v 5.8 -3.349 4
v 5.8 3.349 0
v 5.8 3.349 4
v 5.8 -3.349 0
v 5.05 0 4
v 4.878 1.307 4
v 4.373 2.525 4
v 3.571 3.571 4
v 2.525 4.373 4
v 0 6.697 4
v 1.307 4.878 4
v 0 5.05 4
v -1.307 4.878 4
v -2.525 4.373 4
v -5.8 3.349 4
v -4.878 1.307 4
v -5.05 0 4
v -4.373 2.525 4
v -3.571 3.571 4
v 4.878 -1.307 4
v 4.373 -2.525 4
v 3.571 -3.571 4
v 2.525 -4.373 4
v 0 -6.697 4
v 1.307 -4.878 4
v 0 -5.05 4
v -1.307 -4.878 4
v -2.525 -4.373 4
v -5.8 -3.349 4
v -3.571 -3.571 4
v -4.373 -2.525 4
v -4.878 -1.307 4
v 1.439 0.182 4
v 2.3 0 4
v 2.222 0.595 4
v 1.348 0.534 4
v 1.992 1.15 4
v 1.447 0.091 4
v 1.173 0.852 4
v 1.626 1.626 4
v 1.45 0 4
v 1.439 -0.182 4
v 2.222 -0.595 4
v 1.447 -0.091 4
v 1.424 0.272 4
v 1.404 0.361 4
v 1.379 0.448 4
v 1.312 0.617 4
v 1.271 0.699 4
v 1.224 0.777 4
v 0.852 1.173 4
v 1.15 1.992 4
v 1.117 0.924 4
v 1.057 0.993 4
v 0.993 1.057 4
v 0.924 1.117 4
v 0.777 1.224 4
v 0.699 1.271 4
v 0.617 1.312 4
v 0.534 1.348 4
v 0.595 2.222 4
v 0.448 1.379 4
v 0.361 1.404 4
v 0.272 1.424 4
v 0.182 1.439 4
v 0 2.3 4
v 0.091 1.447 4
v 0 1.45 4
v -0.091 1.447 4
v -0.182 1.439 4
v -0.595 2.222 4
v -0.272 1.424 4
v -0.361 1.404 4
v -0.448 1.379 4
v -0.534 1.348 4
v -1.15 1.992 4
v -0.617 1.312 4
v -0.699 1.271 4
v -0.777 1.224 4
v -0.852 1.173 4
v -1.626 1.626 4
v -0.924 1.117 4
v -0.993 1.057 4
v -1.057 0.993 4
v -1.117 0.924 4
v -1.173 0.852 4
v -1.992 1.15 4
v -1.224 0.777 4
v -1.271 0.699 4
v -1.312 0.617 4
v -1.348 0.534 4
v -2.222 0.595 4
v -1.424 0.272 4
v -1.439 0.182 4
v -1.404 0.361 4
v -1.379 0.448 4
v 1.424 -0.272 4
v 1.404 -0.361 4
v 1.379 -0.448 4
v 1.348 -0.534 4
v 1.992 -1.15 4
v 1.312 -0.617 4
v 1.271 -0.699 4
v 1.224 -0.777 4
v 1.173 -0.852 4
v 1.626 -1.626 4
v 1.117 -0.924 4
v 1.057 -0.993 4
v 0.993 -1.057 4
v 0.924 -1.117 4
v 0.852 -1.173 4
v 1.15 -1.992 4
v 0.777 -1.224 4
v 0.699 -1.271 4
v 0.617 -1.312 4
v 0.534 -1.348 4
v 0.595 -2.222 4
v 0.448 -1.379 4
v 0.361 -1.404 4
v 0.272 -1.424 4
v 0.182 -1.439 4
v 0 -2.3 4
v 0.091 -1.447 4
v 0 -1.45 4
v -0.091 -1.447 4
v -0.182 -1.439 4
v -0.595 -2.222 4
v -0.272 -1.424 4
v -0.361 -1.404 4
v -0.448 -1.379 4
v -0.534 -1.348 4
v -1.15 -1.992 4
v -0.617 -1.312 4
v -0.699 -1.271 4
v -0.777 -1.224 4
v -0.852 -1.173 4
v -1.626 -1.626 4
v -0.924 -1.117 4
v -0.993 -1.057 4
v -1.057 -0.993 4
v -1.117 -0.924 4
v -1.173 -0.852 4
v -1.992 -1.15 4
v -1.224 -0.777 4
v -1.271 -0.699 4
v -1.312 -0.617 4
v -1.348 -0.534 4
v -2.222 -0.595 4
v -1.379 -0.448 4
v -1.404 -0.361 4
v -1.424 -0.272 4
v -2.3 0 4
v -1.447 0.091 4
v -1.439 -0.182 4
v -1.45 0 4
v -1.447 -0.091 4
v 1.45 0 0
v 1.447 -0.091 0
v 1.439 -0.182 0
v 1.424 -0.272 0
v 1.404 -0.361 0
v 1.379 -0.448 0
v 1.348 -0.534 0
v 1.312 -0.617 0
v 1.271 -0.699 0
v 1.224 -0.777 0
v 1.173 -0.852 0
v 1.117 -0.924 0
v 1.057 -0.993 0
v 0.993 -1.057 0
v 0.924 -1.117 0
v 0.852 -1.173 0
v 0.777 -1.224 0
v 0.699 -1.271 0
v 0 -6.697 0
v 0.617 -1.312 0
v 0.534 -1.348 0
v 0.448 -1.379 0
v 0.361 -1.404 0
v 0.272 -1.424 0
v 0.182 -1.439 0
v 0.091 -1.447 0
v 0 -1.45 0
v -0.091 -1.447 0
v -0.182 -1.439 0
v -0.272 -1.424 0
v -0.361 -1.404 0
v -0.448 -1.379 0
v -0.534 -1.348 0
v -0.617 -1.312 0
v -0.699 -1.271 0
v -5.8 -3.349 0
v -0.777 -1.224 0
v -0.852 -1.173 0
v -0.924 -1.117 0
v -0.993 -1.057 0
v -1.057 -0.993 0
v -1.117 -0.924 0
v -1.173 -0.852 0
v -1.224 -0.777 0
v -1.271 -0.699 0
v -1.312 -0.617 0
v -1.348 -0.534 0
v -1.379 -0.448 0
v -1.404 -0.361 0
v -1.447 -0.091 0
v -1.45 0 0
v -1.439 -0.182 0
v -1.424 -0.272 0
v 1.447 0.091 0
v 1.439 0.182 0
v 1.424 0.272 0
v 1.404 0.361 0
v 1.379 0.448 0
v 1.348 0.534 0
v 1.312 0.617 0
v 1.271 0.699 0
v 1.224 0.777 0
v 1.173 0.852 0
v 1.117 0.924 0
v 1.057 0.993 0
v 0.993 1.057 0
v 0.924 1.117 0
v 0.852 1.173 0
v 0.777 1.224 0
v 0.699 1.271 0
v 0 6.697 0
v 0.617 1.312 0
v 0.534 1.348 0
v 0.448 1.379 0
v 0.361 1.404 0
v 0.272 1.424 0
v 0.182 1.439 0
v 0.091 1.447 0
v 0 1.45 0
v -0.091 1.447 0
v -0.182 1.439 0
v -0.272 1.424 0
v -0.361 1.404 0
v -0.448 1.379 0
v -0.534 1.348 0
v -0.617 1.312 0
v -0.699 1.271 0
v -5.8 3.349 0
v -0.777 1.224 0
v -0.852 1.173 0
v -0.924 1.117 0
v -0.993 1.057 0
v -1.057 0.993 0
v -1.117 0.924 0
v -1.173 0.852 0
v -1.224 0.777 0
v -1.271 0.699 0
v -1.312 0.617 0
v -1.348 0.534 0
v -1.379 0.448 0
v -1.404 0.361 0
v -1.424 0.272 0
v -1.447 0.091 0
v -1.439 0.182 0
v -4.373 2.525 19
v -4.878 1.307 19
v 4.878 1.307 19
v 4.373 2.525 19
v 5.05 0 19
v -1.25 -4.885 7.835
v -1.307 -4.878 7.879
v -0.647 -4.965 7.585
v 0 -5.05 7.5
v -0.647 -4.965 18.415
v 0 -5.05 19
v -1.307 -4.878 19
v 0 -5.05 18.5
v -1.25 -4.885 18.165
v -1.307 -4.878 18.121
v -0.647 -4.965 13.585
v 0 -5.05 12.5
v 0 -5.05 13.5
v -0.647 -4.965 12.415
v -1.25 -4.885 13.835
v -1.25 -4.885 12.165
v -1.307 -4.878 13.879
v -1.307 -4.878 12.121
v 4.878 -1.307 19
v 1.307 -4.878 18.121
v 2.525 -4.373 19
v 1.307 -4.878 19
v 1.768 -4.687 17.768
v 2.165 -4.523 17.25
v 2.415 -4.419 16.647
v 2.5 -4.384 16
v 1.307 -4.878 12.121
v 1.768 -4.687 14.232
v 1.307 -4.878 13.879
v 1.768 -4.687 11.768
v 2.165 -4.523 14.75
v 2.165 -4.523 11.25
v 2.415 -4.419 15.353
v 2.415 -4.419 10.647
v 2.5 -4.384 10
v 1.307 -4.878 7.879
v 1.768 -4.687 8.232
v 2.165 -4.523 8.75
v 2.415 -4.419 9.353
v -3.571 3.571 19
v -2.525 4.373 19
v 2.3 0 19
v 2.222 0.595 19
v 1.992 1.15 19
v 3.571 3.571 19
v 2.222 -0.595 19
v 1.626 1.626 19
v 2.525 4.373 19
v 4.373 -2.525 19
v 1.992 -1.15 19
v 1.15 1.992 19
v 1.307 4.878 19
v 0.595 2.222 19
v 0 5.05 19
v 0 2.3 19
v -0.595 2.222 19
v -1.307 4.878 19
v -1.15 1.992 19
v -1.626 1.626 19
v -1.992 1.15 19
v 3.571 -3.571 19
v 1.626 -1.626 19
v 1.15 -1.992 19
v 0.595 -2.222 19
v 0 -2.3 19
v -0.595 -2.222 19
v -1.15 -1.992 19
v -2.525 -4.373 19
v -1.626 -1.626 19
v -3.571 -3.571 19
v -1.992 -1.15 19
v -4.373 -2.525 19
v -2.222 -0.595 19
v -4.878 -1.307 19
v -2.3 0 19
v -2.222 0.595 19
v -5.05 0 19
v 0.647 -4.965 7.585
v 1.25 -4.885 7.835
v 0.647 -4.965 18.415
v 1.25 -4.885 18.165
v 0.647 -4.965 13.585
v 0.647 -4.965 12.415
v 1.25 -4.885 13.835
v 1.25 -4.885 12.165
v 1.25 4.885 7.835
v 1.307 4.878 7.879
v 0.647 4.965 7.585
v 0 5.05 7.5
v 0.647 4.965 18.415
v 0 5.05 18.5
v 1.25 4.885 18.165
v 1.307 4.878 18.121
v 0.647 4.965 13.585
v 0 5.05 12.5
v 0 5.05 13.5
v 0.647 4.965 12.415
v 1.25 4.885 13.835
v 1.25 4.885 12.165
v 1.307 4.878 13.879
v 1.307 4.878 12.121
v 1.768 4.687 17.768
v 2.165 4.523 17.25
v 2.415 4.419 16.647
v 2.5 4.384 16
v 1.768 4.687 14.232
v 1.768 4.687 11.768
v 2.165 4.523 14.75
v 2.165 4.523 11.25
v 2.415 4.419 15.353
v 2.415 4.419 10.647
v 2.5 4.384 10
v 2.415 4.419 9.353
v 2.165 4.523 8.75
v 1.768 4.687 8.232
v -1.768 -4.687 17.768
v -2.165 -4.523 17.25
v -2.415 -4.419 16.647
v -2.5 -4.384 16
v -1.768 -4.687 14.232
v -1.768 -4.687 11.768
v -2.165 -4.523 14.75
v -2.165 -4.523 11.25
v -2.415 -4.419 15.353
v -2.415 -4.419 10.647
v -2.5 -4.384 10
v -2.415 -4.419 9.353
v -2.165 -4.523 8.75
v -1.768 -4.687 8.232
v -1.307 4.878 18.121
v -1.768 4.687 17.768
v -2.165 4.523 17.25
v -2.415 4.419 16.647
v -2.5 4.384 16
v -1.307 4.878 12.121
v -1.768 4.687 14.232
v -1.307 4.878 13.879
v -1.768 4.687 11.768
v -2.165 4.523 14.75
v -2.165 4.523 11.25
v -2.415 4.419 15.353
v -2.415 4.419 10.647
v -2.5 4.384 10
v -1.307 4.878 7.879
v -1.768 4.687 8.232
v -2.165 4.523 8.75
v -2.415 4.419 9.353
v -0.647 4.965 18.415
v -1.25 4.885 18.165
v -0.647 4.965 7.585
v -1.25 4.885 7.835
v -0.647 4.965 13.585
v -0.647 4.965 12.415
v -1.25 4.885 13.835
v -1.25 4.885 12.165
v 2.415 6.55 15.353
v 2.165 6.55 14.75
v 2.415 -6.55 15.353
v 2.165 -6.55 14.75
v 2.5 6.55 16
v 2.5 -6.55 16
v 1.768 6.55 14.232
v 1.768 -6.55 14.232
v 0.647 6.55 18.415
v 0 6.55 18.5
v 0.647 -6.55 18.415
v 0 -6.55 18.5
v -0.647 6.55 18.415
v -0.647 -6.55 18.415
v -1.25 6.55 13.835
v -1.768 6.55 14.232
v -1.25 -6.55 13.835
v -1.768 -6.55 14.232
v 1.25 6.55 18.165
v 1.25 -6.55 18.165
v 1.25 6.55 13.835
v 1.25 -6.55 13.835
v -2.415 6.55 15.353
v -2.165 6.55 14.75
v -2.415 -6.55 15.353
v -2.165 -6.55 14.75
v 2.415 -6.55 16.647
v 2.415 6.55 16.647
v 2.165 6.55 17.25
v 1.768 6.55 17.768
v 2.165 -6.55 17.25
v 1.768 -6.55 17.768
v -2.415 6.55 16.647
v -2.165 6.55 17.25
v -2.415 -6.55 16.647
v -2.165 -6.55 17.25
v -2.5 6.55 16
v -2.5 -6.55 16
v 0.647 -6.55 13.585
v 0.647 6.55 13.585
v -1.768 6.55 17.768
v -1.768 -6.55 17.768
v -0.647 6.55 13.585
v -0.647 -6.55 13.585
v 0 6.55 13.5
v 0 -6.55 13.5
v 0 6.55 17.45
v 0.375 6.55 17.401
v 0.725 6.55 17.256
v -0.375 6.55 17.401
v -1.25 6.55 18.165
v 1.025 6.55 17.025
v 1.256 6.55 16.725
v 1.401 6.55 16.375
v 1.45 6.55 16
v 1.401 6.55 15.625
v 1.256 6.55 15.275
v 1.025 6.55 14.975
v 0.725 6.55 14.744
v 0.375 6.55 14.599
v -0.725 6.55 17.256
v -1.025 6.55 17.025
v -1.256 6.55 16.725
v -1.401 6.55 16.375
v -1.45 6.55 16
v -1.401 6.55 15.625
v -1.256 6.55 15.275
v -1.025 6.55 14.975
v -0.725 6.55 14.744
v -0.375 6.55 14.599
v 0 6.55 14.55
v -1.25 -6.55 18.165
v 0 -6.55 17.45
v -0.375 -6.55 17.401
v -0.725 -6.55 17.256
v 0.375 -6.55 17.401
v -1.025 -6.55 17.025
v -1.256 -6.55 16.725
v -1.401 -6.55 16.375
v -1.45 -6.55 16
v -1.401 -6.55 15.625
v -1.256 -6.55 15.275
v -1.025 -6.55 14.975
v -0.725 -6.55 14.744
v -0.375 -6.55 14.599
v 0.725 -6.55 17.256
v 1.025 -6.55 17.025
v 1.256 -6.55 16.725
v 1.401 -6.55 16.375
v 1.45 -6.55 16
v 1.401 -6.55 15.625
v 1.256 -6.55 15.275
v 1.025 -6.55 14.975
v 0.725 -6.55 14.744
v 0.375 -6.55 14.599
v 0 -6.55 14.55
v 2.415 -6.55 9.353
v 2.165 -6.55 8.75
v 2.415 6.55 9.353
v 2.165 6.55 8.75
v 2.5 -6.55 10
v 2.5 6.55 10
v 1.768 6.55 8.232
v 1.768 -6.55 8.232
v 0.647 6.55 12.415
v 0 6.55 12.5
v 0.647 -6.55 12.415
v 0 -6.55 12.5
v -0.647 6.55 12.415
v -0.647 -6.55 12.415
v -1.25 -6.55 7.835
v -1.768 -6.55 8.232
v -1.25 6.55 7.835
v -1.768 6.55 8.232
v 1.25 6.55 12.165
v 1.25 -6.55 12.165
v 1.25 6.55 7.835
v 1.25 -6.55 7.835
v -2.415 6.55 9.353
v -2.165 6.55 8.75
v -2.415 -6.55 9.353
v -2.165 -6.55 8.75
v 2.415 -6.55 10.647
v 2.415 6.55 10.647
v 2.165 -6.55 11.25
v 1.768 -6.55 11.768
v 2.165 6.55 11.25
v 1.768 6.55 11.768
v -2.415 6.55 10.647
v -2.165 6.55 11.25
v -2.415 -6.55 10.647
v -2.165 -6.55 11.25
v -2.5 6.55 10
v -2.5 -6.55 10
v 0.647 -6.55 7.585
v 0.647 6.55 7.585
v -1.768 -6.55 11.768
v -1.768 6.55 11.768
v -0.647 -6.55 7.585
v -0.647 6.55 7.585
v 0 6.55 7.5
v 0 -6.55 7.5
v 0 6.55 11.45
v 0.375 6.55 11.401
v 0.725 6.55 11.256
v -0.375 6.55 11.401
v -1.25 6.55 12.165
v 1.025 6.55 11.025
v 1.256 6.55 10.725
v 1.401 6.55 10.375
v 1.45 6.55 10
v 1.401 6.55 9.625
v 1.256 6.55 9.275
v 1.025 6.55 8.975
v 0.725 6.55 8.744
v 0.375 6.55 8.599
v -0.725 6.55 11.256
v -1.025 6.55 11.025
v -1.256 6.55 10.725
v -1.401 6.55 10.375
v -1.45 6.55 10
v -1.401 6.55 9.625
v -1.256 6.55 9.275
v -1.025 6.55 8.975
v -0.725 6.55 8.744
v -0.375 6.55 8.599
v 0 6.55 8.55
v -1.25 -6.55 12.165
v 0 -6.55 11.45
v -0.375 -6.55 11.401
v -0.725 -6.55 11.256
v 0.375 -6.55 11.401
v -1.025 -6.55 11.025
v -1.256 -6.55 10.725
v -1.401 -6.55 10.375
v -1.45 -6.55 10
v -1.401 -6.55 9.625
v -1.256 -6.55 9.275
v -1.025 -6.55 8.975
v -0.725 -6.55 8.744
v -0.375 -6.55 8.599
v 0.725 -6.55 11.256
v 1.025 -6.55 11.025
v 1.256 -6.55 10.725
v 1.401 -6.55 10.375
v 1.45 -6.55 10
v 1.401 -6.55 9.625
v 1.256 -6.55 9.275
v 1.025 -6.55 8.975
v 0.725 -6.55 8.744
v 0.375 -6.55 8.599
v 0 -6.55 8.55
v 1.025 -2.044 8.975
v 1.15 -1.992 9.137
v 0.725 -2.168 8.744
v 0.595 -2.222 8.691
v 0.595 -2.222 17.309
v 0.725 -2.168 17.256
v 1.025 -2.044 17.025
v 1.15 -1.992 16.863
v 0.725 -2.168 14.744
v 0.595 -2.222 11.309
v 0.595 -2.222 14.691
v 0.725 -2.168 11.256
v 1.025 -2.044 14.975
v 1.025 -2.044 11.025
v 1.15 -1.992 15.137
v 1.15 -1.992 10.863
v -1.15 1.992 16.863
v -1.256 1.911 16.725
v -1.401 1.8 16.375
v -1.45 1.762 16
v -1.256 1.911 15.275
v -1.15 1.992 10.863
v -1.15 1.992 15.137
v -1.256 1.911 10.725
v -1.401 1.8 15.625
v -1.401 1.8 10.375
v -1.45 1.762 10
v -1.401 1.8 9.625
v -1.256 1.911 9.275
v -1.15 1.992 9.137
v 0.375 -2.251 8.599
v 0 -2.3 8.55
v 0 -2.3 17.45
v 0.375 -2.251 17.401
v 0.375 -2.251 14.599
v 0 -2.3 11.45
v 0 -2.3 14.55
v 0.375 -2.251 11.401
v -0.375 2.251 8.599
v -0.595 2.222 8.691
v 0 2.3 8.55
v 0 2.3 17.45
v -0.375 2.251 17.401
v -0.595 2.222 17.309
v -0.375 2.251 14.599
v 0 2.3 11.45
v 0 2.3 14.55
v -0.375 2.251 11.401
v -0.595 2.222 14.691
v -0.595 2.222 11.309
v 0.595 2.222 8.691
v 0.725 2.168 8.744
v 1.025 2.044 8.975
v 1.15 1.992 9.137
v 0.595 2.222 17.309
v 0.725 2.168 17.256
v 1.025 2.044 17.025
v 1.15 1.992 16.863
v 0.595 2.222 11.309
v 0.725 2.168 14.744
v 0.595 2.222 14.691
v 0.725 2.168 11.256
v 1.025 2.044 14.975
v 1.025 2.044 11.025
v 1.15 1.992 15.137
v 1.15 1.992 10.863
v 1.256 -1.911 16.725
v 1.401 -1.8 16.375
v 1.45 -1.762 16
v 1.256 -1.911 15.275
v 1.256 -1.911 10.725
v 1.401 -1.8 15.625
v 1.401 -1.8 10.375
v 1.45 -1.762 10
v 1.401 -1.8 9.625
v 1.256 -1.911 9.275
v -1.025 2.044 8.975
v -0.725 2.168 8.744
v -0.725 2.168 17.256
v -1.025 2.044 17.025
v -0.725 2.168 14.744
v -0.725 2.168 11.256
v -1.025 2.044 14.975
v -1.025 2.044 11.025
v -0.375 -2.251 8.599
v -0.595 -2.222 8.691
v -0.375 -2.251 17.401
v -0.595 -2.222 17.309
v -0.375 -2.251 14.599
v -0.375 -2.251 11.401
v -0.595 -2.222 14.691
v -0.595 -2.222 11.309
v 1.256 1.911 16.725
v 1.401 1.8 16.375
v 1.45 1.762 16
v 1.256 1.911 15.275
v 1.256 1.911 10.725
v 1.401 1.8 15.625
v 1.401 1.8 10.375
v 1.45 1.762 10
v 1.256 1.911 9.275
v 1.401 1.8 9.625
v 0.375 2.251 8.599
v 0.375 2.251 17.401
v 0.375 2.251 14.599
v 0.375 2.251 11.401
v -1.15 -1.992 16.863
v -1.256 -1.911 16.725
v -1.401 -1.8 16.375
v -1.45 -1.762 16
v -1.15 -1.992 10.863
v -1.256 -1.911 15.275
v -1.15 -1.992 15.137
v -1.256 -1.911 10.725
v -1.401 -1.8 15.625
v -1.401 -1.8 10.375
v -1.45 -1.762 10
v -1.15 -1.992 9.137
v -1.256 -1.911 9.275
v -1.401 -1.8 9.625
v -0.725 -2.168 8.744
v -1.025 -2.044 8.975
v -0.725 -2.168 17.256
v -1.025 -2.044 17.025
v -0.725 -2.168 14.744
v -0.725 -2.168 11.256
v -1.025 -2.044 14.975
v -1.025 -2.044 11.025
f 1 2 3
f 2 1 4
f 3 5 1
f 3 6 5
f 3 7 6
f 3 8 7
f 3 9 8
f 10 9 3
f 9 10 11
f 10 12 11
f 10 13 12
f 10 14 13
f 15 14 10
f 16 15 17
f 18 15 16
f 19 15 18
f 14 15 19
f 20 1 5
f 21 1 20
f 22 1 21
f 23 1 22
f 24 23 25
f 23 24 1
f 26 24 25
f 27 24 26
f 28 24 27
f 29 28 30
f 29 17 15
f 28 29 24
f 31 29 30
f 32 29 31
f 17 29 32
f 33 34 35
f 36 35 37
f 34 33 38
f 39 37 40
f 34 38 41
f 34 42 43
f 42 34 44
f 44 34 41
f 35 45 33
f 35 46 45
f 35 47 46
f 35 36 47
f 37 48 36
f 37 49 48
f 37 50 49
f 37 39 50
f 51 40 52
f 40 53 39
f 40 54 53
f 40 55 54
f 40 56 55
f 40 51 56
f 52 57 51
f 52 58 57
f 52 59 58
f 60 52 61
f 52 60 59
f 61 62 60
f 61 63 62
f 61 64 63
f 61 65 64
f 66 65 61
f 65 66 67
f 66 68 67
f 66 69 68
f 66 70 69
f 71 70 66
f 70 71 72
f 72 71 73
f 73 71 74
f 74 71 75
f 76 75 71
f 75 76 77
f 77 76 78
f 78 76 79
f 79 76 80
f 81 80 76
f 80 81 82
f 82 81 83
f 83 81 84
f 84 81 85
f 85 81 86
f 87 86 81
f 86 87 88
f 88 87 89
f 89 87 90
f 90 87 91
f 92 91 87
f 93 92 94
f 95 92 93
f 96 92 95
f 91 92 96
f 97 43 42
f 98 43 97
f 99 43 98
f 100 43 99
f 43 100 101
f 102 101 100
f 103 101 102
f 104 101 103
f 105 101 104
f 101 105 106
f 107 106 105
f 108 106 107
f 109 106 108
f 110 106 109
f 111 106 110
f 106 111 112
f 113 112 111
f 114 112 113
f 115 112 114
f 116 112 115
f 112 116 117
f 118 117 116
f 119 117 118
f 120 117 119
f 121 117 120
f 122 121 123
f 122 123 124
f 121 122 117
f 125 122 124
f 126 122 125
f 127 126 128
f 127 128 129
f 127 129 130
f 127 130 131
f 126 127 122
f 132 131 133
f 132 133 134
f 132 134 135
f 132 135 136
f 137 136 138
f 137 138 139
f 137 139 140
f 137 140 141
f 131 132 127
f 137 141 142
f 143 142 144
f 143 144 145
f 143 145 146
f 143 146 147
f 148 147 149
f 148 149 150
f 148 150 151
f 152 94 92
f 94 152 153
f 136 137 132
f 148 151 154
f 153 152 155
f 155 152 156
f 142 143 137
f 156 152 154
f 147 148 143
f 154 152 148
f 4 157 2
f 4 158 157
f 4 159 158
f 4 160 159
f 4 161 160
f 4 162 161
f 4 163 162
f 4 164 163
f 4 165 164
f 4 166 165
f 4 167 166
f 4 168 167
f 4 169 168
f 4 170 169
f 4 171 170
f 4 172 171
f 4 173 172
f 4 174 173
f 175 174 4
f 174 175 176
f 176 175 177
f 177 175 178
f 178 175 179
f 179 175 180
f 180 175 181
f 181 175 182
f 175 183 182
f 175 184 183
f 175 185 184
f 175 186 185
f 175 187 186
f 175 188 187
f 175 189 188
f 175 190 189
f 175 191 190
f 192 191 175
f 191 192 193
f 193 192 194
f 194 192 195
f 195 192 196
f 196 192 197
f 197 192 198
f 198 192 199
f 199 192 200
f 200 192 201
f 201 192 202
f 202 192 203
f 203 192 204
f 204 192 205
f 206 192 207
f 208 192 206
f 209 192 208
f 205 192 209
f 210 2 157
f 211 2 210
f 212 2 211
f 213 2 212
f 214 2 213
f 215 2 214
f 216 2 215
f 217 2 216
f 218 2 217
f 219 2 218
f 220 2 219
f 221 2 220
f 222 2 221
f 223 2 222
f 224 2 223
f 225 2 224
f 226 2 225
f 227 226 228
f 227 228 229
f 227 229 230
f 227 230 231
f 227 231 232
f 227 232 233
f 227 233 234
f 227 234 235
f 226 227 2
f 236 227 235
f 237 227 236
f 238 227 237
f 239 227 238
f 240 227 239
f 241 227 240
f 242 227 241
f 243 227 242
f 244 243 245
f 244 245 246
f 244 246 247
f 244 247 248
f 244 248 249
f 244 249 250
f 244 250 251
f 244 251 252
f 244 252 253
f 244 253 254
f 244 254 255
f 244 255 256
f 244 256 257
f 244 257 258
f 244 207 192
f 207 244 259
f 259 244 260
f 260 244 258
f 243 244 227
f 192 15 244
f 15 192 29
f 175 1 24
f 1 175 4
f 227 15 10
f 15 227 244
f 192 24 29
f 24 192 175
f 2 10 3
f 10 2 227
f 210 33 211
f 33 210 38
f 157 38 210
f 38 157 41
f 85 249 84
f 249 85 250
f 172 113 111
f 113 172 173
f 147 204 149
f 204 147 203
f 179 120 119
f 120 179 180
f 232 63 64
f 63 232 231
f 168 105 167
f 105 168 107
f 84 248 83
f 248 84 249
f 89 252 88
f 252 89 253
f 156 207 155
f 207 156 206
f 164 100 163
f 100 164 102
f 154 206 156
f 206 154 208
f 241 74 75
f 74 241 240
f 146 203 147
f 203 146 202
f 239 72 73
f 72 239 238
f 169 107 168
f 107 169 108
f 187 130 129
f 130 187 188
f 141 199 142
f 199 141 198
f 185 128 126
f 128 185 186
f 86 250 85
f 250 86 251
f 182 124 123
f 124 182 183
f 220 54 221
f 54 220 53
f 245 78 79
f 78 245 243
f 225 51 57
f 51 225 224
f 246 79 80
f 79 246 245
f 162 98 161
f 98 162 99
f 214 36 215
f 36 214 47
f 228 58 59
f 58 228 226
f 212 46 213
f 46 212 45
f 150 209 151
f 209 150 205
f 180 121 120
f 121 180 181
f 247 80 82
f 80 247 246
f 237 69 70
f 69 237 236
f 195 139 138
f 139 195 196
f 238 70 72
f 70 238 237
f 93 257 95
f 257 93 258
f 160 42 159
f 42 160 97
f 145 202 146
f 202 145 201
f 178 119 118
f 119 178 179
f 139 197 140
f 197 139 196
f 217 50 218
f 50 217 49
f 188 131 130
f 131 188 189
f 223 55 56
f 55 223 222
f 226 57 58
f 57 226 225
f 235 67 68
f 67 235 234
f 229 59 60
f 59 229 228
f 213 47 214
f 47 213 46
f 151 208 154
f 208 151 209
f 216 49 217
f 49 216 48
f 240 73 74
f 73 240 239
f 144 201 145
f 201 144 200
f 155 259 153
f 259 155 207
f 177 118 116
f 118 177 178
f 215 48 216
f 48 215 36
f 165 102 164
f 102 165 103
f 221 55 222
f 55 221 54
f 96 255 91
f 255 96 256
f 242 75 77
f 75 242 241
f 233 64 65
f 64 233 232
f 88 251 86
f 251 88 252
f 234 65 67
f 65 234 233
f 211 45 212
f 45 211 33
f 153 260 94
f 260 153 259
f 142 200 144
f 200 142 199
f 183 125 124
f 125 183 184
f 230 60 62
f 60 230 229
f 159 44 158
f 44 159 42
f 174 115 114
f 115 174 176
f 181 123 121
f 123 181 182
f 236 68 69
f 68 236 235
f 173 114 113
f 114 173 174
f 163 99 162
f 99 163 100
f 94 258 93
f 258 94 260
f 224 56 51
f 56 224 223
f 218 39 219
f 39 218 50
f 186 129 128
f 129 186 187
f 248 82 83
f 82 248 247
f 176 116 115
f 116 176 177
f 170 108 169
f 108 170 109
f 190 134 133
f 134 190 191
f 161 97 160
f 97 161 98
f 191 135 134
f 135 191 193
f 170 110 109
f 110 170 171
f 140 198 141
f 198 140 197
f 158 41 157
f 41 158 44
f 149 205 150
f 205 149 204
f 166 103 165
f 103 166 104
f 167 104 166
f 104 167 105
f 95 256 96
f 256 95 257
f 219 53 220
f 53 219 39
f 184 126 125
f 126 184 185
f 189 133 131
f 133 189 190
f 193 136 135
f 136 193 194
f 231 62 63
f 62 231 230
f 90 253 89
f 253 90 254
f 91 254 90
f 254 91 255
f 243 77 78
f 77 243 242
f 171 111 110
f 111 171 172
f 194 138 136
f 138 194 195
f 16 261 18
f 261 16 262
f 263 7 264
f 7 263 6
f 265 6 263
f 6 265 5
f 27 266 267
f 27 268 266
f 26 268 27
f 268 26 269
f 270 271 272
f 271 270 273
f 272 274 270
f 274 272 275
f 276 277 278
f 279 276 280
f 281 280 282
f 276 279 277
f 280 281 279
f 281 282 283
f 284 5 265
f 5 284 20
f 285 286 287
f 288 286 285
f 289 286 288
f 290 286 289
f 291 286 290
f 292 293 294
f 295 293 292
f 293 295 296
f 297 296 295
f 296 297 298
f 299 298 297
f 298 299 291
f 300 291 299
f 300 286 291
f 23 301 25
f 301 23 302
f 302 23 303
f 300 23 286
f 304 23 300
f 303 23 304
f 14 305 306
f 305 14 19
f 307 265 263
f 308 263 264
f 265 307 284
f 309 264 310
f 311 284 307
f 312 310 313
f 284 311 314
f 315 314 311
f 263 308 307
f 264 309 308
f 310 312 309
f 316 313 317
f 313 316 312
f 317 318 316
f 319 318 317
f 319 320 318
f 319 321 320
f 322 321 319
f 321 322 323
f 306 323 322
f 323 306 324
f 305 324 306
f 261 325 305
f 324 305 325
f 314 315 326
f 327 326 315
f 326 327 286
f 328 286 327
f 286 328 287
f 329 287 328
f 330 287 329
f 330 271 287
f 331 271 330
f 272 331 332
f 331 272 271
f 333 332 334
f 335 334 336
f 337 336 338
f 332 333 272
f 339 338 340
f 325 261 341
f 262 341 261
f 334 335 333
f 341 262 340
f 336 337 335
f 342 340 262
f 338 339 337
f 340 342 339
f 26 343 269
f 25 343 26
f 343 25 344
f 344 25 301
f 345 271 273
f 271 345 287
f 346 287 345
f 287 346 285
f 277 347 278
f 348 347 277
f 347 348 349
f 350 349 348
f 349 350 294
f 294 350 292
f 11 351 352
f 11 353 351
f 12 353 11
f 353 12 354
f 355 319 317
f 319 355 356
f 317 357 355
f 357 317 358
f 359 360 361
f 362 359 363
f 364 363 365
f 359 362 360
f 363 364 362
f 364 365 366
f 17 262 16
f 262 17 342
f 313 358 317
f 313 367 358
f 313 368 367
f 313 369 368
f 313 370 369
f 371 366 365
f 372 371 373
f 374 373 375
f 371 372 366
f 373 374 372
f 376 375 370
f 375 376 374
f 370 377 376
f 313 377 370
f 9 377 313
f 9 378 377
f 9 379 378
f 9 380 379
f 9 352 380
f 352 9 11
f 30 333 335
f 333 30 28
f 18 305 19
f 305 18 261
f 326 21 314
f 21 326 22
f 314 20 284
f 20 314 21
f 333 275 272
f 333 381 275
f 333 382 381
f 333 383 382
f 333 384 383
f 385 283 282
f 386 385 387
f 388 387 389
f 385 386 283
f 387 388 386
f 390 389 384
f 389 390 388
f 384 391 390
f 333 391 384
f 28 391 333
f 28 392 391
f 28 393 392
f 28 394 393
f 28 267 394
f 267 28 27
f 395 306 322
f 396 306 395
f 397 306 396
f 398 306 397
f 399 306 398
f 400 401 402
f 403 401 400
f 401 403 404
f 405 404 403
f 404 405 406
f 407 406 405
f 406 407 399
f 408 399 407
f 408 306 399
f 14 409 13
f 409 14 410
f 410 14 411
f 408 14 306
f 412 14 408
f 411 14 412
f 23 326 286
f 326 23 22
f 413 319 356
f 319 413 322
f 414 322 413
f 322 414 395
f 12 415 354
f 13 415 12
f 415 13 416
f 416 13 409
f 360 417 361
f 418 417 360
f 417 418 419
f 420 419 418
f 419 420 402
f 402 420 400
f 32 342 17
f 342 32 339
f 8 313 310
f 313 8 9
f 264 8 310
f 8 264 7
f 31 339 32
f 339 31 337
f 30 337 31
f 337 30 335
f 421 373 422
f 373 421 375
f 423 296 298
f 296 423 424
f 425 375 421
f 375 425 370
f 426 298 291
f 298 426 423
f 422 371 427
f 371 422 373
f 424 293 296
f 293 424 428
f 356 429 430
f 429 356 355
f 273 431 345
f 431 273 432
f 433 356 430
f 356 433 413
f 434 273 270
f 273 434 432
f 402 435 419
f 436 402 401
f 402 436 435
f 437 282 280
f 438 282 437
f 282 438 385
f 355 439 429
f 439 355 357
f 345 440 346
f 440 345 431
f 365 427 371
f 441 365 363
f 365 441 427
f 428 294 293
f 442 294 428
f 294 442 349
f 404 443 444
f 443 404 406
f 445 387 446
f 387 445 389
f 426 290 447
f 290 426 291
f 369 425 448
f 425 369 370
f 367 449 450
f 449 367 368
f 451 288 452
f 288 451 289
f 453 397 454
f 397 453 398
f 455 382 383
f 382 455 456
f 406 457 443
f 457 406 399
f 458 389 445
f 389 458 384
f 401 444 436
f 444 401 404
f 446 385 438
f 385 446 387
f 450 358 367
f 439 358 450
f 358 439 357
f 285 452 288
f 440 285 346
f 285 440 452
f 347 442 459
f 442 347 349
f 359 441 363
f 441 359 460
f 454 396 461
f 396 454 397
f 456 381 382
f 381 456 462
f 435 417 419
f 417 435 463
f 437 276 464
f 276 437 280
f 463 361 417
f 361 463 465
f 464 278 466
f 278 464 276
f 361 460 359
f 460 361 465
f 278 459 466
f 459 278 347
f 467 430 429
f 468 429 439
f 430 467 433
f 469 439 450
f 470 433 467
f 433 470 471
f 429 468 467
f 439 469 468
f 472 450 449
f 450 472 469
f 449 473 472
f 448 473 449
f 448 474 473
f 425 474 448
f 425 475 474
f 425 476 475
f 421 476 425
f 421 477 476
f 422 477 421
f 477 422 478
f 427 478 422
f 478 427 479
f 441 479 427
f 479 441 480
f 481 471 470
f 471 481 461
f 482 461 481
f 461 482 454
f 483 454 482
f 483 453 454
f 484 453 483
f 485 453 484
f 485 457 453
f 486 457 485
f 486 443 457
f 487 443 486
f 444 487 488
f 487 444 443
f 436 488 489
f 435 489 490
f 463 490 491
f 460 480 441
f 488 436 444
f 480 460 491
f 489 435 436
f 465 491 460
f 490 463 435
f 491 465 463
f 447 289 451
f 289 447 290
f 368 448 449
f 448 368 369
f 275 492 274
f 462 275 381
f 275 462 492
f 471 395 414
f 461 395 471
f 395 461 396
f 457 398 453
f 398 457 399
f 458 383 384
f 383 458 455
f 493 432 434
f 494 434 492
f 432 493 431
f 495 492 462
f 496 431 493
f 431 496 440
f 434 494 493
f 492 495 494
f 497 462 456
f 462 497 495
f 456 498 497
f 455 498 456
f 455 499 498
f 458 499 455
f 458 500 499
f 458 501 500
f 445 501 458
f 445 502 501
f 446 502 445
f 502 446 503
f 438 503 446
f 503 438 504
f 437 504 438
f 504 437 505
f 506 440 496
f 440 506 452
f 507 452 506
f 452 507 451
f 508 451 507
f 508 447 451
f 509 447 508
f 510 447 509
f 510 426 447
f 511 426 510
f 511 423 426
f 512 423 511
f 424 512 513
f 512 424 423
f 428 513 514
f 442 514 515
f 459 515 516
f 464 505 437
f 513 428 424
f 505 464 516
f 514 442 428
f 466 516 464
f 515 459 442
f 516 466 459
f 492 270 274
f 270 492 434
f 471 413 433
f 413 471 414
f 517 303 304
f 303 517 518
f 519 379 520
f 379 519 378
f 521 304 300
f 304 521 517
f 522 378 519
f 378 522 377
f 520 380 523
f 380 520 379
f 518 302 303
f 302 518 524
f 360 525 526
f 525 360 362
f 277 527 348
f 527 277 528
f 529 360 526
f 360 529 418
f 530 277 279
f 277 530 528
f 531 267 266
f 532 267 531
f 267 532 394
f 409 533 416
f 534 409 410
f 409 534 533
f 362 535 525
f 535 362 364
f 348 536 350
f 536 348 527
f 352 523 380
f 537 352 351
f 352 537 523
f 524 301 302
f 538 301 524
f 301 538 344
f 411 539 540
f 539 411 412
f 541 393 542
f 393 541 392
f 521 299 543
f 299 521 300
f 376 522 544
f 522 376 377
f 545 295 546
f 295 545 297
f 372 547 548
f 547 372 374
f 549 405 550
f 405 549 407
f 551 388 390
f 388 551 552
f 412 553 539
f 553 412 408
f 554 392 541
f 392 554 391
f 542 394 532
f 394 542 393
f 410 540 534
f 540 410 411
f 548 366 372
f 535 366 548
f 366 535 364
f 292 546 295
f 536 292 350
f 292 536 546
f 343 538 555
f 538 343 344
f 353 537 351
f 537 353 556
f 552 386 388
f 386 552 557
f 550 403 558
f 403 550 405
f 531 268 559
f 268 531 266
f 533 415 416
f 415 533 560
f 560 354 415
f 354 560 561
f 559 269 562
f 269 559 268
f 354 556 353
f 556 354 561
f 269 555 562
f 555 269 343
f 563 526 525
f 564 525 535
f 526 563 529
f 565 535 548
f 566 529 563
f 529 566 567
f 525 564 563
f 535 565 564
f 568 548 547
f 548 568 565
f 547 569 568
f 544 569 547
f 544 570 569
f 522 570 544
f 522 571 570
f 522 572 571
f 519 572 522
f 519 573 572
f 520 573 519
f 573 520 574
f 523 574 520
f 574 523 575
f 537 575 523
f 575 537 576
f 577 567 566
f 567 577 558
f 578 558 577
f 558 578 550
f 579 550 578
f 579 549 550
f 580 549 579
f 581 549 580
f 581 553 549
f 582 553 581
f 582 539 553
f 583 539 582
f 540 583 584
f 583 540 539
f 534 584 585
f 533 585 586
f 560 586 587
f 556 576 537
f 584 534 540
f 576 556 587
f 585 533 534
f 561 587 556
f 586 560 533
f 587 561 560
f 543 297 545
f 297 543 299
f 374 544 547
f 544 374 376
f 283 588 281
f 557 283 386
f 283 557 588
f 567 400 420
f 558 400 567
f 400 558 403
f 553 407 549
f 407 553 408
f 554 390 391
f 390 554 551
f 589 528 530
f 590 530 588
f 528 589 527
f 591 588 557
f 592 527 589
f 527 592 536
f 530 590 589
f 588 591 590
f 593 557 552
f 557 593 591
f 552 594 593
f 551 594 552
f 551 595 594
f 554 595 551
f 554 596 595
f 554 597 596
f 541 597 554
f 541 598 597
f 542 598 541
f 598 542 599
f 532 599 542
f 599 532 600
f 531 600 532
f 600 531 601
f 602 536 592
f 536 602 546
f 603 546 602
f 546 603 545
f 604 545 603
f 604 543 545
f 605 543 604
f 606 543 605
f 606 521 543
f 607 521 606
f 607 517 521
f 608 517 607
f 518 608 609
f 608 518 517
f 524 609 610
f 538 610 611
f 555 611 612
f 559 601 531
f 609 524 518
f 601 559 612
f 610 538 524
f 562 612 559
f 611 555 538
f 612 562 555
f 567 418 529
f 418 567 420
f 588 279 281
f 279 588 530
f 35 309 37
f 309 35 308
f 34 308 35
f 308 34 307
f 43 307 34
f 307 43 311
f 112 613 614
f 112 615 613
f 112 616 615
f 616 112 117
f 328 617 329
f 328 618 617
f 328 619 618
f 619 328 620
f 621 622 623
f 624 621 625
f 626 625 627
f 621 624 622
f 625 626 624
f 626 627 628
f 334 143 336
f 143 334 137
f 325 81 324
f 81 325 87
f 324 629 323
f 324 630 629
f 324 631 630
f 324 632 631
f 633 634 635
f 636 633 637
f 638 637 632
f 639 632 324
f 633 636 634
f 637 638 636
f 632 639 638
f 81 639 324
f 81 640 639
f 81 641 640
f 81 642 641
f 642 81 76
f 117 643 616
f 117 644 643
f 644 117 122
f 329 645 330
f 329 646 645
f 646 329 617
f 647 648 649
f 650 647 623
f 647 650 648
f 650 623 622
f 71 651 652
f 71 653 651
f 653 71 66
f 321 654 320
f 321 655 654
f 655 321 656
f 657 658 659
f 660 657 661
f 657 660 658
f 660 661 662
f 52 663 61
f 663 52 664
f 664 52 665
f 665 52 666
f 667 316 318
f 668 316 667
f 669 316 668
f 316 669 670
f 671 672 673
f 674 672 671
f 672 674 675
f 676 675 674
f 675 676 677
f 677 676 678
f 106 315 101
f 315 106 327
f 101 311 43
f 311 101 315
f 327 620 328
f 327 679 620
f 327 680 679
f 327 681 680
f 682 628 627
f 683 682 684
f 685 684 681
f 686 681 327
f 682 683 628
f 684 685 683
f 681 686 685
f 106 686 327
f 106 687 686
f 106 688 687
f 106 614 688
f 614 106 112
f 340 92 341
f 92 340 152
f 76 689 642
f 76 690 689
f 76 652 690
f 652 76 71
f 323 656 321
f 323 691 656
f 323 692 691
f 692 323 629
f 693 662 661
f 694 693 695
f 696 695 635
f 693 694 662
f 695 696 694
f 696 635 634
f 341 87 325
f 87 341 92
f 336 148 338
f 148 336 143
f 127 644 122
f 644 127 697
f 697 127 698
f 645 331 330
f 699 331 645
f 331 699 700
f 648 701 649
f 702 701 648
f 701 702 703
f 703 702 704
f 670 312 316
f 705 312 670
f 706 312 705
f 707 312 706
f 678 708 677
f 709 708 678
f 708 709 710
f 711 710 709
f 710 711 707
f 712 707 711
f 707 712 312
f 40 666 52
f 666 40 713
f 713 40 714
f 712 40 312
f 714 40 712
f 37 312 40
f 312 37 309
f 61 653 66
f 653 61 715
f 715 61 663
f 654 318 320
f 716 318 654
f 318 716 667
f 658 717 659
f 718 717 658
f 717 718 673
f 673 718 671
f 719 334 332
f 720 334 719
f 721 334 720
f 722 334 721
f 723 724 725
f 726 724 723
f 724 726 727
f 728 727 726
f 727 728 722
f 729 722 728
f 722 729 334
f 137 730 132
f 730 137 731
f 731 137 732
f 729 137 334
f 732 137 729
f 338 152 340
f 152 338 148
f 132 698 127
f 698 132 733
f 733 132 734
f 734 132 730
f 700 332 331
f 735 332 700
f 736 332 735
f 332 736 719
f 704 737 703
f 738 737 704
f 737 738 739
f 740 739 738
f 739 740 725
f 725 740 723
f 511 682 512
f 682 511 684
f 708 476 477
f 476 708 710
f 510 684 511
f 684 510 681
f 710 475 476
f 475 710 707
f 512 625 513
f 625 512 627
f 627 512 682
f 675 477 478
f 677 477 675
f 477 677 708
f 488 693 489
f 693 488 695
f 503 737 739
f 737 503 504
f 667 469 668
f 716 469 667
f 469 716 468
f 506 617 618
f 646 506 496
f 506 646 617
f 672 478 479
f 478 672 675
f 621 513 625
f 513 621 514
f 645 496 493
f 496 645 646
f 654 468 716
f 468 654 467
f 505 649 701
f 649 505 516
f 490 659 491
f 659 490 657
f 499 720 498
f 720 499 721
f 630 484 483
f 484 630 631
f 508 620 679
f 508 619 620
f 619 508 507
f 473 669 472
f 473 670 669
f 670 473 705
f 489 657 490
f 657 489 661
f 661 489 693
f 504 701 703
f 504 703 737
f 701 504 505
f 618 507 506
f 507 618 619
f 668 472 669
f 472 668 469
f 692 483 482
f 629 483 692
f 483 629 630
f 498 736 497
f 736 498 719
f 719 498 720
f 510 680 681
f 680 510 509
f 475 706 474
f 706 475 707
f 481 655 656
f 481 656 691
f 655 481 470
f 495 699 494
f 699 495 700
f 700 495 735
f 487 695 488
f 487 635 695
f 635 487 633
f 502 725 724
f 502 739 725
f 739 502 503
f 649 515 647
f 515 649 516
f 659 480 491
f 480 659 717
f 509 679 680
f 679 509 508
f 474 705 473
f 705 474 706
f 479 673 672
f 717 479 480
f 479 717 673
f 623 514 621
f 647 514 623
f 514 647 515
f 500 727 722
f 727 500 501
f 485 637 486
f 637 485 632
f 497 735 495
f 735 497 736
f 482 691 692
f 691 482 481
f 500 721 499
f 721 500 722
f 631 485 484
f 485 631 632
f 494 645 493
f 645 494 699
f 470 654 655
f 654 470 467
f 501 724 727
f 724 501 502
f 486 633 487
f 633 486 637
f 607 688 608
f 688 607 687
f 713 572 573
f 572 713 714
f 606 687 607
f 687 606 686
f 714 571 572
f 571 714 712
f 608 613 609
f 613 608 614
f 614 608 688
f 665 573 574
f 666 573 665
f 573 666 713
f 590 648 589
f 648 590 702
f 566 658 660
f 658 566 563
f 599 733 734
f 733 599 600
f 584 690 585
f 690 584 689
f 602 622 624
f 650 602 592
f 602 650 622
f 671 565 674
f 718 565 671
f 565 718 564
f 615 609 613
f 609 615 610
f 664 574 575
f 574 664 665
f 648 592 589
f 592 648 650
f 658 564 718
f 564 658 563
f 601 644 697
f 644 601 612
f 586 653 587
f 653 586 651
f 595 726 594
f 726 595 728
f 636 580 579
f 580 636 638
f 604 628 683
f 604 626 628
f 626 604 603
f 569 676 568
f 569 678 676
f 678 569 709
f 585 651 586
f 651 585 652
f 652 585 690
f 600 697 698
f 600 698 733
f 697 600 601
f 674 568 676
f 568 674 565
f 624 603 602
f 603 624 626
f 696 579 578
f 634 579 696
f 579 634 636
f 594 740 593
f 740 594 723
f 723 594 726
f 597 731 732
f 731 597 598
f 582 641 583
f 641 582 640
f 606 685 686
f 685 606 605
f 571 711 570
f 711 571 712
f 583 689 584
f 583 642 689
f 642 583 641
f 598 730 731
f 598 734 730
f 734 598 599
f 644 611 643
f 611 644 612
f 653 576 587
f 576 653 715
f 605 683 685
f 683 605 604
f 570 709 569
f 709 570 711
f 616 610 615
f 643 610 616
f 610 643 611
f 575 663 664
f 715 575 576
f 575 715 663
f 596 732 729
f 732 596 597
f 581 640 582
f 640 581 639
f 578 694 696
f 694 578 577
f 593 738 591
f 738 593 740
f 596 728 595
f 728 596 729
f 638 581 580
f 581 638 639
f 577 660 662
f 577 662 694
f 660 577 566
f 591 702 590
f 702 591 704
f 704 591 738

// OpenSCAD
/*
 * Module: project_12mm_hex_wheel_adaptors.scad
 * this generates an adaptor the connects standard RC wheel 12mm hex nut
 *   wheels to standard robotics motor hubs  
 *
 *   NOTE that hub adaptors should be printed slowly -- about 50% normal print speed 
 *
 * Author(s): Don Korte 
 *
 * github: https://github.com/dnkorte/
 *  
 * MIT License
 * 
 * Copyright (c) 2022 Don Korte
 * 
 * Permission is hereby granted, free of charge, to any person obtaining a copy
 * of this software and associated documentation files (the "Software"), to deal
 * in the Software without restriction, including without limitation the rights
 * to use, copy, modify, merge, publish, distribute, sublicense, and/or sell
 * copies of the Software, and to permit persons to whom the Software is
 * furnished to do so, subject to the following conditions:
 * 
 * The above copyright notice and this permission notice shall be included in all
 * copies or substantial portions of the Software.
 * 
 * THE SOFTWARE IS PROVIDED "AS IS", WITHOUT WARRANTY OF ANY KIND, EXPRESS OR
 * IMPLIED, INCLUDING BUT NOT LIMITED TO THE WARRANTIES OF MERCHANTABILITY,
 * FITNESS FOR A PARTICULAR PURPOSE AND NONINFRINGEMENT. IN NO EVENT SHALL THE
 * AUTHORS OR COPYRIGHT HOLDERS BE LIABLE FOR ANY CLAIM, DAMAGES OR OTHER
 * LIABILITY, WHETHER IN AN ACTION OF CONTRACT, TORT OR OTHERWISE, ARISING FROM,
 * OUT OF OR IN CONNECTION WITH THE SOFTWARE OR THE USE OR OTHER DEALINGS IN THE
 * SOFTWARE.
 */


/* [What PART do you want to model?] */
part = "12mm_4mm_adaptor";  // [ "12mm_6mm_adaptor", "12mm_5mm_adaptor", "12mm_4mm_adaptor", "12mm_TT_adaptor" ]

/* [Length of motor shaft] */
// length of "round" part of adaptor that surrounds axle
hub_len = 15;   // [12, 15, 18, 20 ]

/* [Grub Screw Locations] */
// distance of "first" grub screw from end of adaptor
grubscrew_dist_from_end = 3;    // [ 3, 4, 5, 6 ]
// distance between grub screws
grubscrew_separation = 6;       // [ 5, 6, 7, 8 ] 

draw_part();

module draw_part() {
    $fn = 24;

    if (part == "12mm_6mm_adaptor") {
        draw_12mm_6mm_adaptor();
    }
    if (part == "12mm_5mm_adaptor") {
        draw_12mm_5mm_adaptor();
    }
    if (part == "12mm_4mm_adaptor") {
        draw_12mm_4mm_adaptor();
    }
    if (part == "12mm_TT_adaptor") {
        draw_12mm_TT_adaptor();
    }
}
/*
 * hub adaptor parameters that are not displayed in OpenScad Customizer
 */

// standard parameters for all parts
screwhole_radius_M30_passthru = 2;  
screwhole_radius_M30_selftap = 1.45;
axle_clearance_gap = 0.6;   // allowance for 3d printer "slop" + slide fit


// parameters for the 12mm nut
screwhole_dia_wheel_attachment_screw = (screwhole_radius_M30_selftap * 2);
width_across_flats = 11.6;
nut_thick = 4;



module draw_12mm_6mm_adaptor() {
    motor_shaft_dia = 6 + axle_clearance_gap;
    hub_dia = motor_shaft_dia + 5.5;

    g1 = hub_len - grubscrew_dist_from_end;
    g2 = hub_len - grubscrew_dist_from_end - grubscrew_separation;

    make_hex_nut(width_across_flats, nut_thick, screwhole_dia_wheel_attachment_screw);
    
    translate([ 0, 0, nut_thick ]) difference() {
        union() {
            cylinder(d=hub_dia, h=hub_len);
            translate([ 0, -(hub_dia+3)/2, g1 ]) rotate([  -90, 0, 0  ])  cylinder( d=5, h=hub_dia+3);
            translate([ 0, -(hub_dia+3)/2, g2 ]) rotate([  -90, 0, 0  ])  cylinder( d=5, h=hub_dia+3);
        }
        translate([ 0, 0, -0.1 ]) cylinder(d=motor_shaft_dia, h=hub_len + 0.2);
        translate([ 0, -((hub_dia+3)/2)-0.1, g1 ]) rotate([  -90, 0, 0  ])  cylinder( r= screwhole_radius_M30_selftap, h=hub_dia+3.2);
        translate([ 0, -((hub_dia+3)/2)-0.1, g2 ]) rotate([  -90, 0, 0  ])  cylinder( r= screwhole_radius_M30_selftap, h=hub_dia+3.2);
    } 
}


module draw_12mm_5mm_adaptor() {
    motor_shaft_dia = 5 + axle_clearance_gap;
    hub_dia = motor_shaft_dia + 5.5;

    g1 = hub_len - grubscrew_dist_from_end;
    g2 = hub_len - grubscrew_dist_from_end - grubscrew_separation;


    make_hex_nut(width_across_flats, nut_thick, screwhole_dia_wheel_attachment_screw);
    
    translate([ 0, 0, nut_thick ]) difference() {
        union() {
            cylinder(d=hub_dia, h=hub_len);
            translate([ 0, -(hub_dia+3)/2, g1 ]) rotate([  -90, 0, 0  ])  cylinder( d=5, h=hub_dia+3);
            translate([ 0, -(hub_dia+3)/2, g2 ]) rotate([  -90, 0, 0  ])  cylinder( d=5, h=hub_dia+3);
        }
        translate([ 0, 0, -0.1 ]) cylinder(d=motor_shaft_dia, h=hub_len + 0.2);
        translate([ 0, -((hub_dia+3)/2)-0.1, g1 ]) rotate([  -90, 0, 0  ])  cylinder( r= screwhole_radius_M30_selftap, h=hub_dia+3.2);
        translate([ 0, -((hub_dia+3)/2)-0.1, g2 ]) rotate([  -90, 0, 0  ])  cylinder( r= screwhole_radius_M30_selftap, h=hub_dia+3.2);
    } 
}

module draw_12mm_4mm_adaptor() {
    motor_shaft_dia = 4 + axle_clearance_gap;
    hub_dia = motor_shaft_dia + 5.5;

    g1 = hub_len - grubscrew_dist_from_end;
    g2 = hub_len - grubscrew_dist_from_end - grubscrew_separation;


    make_hex_nut(width_across_flats, nut_thick, screwhole_dia_wheel_attachment_screw);
    
    translate([ 0, 0, nut_thick ]) difference() {
        union() {
            cylinder(d=hub_dia, h=hub_len);
            translate([ 0, -(hub_dia+3)/2, g1 ]) rotate([  -90, 0, 0  ])  cylinder( d=5, h=hub_dia+3);
            translate([ 0, -(hub_dia+3)/2, g2 ]) rotate([  -90, 0, 0  ])  cylinder( d=5, h=hub_dia+3);
        }
        translate([ 0, 0, -0.1 ]) cylinder(d=motor_shaft_dia, h=hub_len + 0.2);
        translate([ 0, -((hub_dia+3)/2)-0.1, g1 ]) rotate([  -90, 0, 0  ])  cylinder( r= screwhole_radius_M30_selftap, h=hub_dia+3.2);
        translate([ 0, -((hub_dia+3)/2)-0.1, g2 ]) rotate([  -90, 0, 0  ])  cylinder( r= screwhole_radius_M30_selftap, h=hub_dia+3.2);
    } 
}

module draw_12mm_TT_adaptor() {
    TT_shaft_dia = 5.3 + axle_clearance_gap;
    TT_shaft_flatwidth = 3.8 + axle_clearance_gap;
    hub_dia = 12;

    g1 = hub_len - grubscrew_dist_from_end;
    g2 = hub_len - grubscrew_dist_from_end - grubscrew_separation;

    make_hex_nut(width_across_flats, nut_thick, screwhole_dia_wheel_attachment_screw);
    
    translate([ 0, 0, nut_thick ]) difference() {
        union() {
            cylinder(d=hub_dia, h=hub_len);
            translate([ 0, -(hub_dia+3)/2, g1 ]) rotate([  -90, 0, 0  ])  cylinder( d=5, h=hub_dia+3);
            translate([ 0, -(hub_dia+3)/2, g2 ]) rotate([  -90, 0, 0  ])  cylinder( d=5, h=hub_dia+3);
        }
        translate([ 0, 0, -0.1 ]) shaft_flat(TT_shaft_dia, TT_shaft_flatwidth, hub_len + 0.2, orientation="wide");

        translate([ 0, -((hub_dia+3)/2)-0.1, g1 ]) rotate([  -90, 0, 0  ])  cylinder( r= screwhole_radius_M30_selftap, h=hub_dia+3.2);
        translate([ 0, -((hub_dia+3)/2)-0.1, g2 ]) rotate([  -90, 0, 0  ])  cylinder( r= screwhole_radius_M30_selftap, h=hub_dia+3.2);
    } 
}


/*
 * module prism generates a basic "wedge" shape that can be used vertically to make support-less
 * 3d-printable shelves; this is defined in openSCAD documetation at:
 *      https://en.wikibooks.org/wiki/OpenSCAD_User_Manual/Primitive_Solids
 */

module prism(l, w, h){
   polyhedron(
           points=[[0,0,0], [l,0,0], [l,w,0], [0,w,0], [0,w,h], [l,w,h]],
           faces=[[0,1,2,3],[5,4,3,2],[0,4,5,1],[0,3,4],[5,2,1]]
           );
}

/*
 * ***************************************************************************
 * module shaft_flat() makes a flattened shaft
 * this is a round cylinder, with flats on 2 sides (ie for a TT motor)
 *  
 * this is generated in xy plane, centered at origin, pointed "up" (towards + Z)
 * it should be "added" to design, there are no holes needed at placement level
 *
 * for TT motor, assume actual 5.3 diameter, with flatwidth 3.8mm;  but leave clearance gap too
 *
 * parameters:
 *      diameter    diameter of round part of shaft, in mm
 *      flatwidth   dimension across flat part in mm (flat-to-flat)
 *      length      length (or height) of shaft
 *      orientation "tall" or "wide" 
 *          (for tall, initial flats are on left/right (+/- x sides))
 * ***************************************************************************
 */
module shaft_flat(diameter, flatwidth, length, orientation="tall") {
    remove_from_each_side = (diameter - flatwidth) / 2;

    if (orientation == "tall") {
        difference() {
            cylinder(r=(diameter/2), h=length);
            translate([ -(diameter/2), -(diameter/2), -0.1 ]) 
                cube([ remove_from_each_side, diameter, length+0.2 ]);
            translate([ (diameter/2)-remove_from_each_side, -(diameter/2), -0.1 ]) 
                cube([ remove_from_each_side, diameter, length+0.2 ]);
        }
    } else {
        rotate([ 0, 0, -90 ]) difference() {
            cylinder(r=(diameter/2), h=length);
            translate([ -(diameter/2), -(diameter/2), -0.1 ]) 
                cube([ remove_from_each_side, diameter, length+0.2 ]);
            translate([ (diameter/2)-remove_from_each_side, -(diameter/2), -0.1 ]) 
                cube([ remove_from_each_side, diameter, length+0.2 ]);
        }
    }
}

/*
 * hex nut generator, from
 * https://github.com/chrisspen/openscad-extra
 */


module make_hex_nut(w, h, d=0){
    // d = inner diameter
    // w = width across the flats
    // h = height or thickness
    s = w/sqrt(3);
    $fn = 100;
    
    translate([ 0, 0, h/2 ]) difference(){
        union(){
            for(i=[0:1:2]){
                rotate([0,0,120*i])
                cube([w, s, h], center=true);
            }
        }
        if(d){
            cylinder(d=d, h=h+1, center=true);
        }
    }
}
